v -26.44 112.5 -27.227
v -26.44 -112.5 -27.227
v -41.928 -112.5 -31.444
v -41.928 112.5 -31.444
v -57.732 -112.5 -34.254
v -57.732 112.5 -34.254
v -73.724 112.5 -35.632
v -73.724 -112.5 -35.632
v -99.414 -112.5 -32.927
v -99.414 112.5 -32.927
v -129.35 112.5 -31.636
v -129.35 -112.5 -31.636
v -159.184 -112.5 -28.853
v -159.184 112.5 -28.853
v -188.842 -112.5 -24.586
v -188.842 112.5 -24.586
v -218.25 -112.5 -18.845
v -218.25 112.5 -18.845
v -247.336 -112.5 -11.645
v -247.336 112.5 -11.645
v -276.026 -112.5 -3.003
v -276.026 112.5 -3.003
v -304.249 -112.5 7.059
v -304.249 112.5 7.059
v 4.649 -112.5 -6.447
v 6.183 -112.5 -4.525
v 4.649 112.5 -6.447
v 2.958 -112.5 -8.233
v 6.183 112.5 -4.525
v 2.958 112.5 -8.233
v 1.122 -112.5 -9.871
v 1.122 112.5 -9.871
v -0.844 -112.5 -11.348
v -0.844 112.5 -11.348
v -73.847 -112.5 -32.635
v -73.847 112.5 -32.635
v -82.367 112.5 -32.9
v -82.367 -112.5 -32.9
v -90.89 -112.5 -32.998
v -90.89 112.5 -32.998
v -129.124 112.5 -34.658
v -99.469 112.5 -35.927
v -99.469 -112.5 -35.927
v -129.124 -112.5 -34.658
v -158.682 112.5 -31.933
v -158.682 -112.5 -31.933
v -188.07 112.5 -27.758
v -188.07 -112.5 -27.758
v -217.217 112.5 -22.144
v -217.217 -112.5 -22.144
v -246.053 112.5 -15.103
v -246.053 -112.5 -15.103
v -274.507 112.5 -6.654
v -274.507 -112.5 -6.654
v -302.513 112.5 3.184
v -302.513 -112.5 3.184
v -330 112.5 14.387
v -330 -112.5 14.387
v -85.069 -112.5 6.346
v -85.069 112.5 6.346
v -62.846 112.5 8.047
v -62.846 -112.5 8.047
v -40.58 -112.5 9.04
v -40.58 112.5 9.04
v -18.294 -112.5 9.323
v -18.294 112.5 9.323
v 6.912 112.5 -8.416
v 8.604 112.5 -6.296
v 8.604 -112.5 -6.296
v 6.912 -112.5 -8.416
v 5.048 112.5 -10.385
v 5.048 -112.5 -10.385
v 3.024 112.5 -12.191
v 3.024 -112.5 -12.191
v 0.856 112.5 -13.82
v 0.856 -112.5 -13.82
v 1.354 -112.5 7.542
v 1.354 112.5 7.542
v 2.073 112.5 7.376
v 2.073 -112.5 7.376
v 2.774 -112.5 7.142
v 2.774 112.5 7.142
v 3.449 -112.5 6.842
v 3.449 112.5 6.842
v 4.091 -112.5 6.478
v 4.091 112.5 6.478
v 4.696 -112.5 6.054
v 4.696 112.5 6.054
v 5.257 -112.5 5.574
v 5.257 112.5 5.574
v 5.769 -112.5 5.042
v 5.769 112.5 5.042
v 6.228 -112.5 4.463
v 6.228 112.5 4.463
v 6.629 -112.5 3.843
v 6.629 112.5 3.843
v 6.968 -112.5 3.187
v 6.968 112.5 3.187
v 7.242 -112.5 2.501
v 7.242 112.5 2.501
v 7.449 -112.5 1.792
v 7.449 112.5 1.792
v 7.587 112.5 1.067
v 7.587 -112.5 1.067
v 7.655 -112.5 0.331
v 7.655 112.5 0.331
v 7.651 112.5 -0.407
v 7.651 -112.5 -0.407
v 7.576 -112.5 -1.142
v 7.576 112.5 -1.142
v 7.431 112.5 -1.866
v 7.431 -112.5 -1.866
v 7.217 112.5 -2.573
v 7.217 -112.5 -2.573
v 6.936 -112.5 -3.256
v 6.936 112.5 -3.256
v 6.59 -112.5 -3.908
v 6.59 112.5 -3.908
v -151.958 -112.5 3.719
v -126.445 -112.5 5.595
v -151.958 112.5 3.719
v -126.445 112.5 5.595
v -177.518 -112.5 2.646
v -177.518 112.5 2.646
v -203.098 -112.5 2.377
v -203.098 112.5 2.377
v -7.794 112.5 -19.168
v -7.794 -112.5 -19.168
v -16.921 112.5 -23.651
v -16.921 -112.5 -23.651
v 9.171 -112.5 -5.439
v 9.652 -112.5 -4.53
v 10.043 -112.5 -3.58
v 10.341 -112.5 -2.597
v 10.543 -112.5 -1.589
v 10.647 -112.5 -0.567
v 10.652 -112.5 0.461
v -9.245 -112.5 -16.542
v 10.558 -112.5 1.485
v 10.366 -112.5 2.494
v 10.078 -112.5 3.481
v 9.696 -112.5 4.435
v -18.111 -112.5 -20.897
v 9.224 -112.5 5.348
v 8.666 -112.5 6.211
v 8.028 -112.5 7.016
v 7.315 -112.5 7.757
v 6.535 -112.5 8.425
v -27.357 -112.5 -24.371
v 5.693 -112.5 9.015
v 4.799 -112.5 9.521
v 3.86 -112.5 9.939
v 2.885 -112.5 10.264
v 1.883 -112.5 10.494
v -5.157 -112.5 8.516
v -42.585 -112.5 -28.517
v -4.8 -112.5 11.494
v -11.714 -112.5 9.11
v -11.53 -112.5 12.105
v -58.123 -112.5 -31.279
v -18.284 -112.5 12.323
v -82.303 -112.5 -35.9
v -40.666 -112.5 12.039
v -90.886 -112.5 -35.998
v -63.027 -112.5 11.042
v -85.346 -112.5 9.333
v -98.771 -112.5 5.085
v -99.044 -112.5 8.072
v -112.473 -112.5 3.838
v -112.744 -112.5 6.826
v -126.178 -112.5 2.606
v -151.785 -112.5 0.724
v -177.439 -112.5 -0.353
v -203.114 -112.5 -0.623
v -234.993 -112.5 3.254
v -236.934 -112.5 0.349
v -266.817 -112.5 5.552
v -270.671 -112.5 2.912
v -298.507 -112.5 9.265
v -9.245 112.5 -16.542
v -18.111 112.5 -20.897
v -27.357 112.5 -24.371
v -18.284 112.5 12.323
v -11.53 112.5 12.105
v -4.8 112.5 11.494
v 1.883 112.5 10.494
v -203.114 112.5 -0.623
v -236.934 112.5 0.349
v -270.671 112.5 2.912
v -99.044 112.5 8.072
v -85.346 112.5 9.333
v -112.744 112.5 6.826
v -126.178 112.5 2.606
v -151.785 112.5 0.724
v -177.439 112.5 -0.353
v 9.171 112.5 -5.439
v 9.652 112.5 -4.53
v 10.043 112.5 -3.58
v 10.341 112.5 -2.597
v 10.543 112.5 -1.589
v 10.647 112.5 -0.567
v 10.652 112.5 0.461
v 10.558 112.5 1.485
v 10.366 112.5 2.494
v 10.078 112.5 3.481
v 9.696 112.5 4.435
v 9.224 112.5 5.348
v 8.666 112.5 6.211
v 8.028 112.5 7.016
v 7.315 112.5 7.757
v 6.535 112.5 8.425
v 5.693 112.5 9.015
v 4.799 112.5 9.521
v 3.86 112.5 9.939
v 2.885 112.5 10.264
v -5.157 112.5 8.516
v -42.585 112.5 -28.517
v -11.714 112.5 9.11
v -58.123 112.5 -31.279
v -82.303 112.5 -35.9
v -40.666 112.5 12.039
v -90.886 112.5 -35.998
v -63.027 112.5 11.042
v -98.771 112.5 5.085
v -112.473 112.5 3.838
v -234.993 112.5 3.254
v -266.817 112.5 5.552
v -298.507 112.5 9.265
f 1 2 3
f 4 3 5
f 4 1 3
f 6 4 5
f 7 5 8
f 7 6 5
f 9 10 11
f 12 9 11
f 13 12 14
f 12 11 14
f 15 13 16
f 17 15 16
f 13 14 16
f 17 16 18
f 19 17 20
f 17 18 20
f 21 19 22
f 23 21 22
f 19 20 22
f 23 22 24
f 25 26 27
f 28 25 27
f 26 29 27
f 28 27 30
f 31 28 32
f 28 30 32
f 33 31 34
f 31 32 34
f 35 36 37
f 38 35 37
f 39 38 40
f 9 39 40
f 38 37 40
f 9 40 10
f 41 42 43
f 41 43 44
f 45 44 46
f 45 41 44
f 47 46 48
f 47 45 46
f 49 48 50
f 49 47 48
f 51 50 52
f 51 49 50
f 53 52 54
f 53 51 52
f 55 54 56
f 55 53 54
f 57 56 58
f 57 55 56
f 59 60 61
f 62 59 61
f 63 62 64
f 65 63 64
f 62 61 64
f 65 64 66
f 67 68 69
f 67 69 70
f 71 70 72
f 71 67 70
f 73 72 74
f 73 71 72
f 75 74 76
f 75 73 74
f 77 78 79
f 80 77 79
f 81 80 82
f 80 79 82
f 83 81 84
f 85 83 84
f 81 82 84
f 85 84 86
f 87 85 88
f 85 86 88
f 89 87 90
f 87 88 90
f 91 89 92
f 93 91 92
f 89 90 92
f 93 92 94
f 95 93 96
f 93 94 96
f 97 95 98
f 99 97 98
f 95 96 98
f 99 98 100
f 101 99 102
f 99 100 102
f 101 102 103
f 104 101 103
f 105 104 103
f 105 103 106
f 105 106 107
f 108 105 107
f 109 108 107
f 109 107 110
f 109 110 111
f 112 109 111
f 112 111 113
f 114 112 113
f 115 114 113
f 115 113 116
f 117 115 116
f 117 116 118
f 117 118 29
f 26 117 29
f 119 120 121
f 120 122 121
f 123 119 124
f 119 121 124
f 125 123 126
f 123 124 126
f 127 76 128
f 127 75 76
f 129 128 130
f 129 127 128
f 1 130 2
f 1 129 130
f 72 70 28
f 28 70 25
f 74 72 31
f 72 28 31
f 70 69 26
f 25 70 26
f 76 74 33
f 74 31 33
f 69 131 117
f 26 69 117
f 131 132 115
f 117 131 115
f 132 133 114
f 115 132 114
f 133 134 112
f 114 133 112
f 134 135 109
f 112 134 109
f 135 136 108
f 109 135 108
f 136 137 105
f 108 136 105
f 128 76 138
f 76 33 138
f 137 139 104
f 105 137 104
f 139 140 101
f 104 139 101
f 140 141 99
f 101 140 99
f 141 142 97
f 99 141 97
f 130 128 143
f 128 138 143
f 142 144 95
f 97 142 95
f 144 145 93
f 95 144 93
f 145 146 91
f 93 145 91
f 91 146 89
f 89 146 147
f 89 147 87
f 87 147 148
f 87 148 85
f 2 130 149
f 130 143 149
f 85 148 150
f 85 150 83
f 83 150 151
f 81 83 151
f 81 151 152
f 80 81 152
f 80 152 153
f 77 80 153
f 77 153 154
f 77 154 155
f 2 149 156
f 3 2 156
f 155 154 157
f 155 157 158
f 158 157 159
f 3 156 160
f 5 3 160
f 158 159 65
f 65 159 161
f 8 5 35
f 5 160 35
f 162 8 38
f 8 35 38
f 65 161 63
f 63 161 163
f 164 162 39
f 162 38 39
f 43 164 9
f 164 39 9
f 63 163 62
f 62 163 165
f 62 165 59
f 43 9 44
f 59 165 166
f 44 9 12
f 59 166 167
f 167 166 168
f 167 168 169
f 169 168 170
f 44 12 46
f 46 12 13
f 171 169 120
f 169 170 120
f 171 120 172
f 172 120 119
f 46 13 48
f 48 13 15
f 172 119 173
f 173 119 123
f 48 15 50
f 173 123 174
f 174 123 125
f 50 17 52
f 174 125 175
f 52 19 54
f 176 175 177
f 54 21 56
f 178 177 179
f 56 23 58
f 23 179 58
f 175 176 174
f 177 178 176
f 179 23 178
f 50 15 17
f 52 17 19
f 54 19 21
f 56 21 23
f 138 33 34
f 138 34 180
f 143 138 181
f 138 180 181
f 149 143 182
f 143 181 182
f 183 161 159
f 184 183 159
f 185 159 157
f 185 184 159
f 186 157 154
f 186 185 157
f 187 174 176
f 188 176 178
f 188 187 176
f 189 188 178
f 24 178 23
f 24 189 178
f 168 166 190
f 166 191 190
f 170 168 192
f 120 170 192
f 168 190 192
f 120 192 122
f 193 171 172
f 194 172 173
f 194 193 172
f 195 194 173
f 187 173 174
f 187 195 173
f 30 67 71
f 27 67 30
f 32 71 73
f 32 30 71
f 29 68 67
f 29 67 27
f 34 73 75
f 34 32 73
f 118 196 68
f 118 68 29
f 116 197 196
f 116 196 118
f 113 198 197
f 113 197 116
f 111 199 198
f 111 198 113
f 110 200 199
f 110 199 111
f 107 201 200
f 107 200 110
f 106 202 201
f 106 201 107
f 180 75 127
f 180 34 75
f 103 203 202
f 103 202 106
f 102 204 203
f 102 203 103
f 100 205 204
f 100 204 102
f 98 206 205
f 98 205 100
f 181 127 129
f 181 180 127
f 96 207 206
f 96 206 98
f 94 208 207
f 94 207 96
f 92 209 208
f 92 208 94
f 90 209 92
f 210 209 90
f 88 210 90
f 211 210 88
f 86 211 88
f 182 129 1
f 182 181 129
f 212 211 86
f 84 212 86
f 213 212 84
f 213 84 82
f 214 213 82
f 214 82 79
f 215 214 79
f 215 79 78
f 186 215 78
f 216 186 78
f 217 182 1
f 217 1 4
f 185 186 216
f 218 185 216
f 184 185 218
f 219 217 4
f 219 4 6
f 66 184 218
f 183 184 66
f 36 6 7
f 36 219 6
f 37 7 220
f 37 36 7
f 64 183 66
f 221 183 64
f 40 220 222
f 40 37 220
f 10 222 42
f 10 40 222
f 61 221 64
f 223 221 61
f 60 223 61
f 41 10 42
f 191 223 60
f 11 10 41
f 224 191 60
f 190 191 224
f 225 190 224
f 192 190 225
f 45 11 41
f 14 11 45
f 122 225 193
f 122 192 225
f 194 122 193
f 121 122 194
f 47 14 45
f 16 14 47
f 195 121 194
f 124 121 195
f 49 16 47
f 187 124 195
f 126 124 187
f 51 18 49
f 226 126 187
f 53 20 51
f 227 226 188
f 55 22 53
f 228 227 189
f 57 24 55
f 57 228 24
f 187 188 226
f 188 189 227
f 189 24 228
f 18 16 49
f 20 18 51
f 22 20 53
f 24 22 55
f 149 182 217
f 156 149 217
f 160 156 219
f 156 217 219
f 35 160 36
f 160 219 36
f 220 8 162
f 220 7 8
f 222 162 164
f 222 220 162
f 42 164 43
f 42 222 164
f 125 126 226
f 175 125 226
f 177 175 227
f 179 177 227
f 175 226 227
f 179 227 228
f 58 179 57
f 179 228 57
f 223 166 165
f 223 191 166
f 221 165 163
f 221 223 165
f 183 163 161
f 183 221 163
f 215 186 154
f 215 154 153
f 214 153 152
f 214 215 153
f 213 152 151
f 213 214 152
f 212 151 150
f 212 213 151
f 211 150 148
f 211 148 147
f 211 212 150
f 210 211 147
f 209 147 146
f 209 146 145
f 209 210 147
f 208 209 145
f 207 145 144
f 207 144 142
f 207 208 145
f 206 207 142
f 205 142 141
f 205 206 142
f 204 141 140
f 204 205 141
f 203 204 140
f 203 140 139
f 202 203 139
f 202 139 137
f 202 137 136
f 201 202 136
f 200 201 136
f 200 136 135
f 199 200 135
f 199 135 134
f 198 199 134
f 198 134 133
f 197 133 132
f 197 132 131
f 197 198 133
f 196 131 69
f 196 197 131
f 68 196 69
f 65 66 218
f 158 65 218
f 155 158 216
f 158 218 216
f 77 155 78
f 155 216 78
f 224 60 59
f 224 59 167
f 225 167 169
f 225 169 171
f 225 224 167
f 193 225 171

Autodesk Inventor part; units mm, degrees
ref_plane "YZ Plane" through (0, 0, 0) normal (1, 0, 0) x (0, 1, 0)
ref_plane "XZ Plane" through (0, 0, 0) normal (0, 1, 0) x (-1, 0, 0)
ref_plane "XY Plane" through (0, 0, 0) normal (0, 0, 1) x (1, 0, 0)
sketch "スケッチ1" plane through (0, 0, 0) normal (0, 1, 0) x (-1, 0, 0)
  arc A0 (99.4141, -32.927) -> (304.2493, 7.0592) centre (88.5018, 567.6156) ccw projected
  arc A1 (73.8469, -32.6347) -> (99.4141, -32.927) centre (91.566, 398.982) ccw projected
  arc A2 (27.3573, -24.3709) -> (73.8469, -32.6347) centre (81.048, 142.776) ccw projected
  arc A3 (0.844, -11.3484) -> (27.3573, -24.3709) centre (58.458, 72.45) ccw projected
  arc A4 (-6.1834, -4.5246) -> (0.844, -11.3484) centre (17.4, 12.732) ccw projected
  arc A5 (-1.3535, 7.5415) -> (-6.1834, -4.5246) centre (0, 0) ccw projected
  arc A6 (18.2937, 9.3227) -> (-1.3535, 7.5415) centre (18.66, -103.968) ccw projected
  arc A7 (85.069, 6.346) -> (18.2937, 9.3227) centre (20.556, -690.396) ccw projected
  arc A8 (85.069, 6.346) -> (126.1777, 2.6065) centre (1264.674, 12746.1) ccw projected
  arc A9 (126.1777, 2.6065) -> (203.1141, -0.6229) centre (198.864, 816.2039) ccw projected
  arc A10 (203.1141, -0.6229) -> (304.2493, 7.0592) centre (199.374, 718.188) ccw projected
  circle A11 centre (20, -2.2582) radius 6 projected
  circle A12 centre (130, -14.678) radius 6 projected
extrude "押し出し1" add sketch "スケッチ1" along normal mid plane 225 contours A1 A2 A3 A4 A5 A6 A7 A8 A9 A10 A0 | A11 | A12
shell "シェル1" thickness 3 outward yes removed faces 2 at (-113.7457, 112.5, -20.2414) at (-113.7457, -112.5, -20.2414)
properties part number "GFRP_ms"
